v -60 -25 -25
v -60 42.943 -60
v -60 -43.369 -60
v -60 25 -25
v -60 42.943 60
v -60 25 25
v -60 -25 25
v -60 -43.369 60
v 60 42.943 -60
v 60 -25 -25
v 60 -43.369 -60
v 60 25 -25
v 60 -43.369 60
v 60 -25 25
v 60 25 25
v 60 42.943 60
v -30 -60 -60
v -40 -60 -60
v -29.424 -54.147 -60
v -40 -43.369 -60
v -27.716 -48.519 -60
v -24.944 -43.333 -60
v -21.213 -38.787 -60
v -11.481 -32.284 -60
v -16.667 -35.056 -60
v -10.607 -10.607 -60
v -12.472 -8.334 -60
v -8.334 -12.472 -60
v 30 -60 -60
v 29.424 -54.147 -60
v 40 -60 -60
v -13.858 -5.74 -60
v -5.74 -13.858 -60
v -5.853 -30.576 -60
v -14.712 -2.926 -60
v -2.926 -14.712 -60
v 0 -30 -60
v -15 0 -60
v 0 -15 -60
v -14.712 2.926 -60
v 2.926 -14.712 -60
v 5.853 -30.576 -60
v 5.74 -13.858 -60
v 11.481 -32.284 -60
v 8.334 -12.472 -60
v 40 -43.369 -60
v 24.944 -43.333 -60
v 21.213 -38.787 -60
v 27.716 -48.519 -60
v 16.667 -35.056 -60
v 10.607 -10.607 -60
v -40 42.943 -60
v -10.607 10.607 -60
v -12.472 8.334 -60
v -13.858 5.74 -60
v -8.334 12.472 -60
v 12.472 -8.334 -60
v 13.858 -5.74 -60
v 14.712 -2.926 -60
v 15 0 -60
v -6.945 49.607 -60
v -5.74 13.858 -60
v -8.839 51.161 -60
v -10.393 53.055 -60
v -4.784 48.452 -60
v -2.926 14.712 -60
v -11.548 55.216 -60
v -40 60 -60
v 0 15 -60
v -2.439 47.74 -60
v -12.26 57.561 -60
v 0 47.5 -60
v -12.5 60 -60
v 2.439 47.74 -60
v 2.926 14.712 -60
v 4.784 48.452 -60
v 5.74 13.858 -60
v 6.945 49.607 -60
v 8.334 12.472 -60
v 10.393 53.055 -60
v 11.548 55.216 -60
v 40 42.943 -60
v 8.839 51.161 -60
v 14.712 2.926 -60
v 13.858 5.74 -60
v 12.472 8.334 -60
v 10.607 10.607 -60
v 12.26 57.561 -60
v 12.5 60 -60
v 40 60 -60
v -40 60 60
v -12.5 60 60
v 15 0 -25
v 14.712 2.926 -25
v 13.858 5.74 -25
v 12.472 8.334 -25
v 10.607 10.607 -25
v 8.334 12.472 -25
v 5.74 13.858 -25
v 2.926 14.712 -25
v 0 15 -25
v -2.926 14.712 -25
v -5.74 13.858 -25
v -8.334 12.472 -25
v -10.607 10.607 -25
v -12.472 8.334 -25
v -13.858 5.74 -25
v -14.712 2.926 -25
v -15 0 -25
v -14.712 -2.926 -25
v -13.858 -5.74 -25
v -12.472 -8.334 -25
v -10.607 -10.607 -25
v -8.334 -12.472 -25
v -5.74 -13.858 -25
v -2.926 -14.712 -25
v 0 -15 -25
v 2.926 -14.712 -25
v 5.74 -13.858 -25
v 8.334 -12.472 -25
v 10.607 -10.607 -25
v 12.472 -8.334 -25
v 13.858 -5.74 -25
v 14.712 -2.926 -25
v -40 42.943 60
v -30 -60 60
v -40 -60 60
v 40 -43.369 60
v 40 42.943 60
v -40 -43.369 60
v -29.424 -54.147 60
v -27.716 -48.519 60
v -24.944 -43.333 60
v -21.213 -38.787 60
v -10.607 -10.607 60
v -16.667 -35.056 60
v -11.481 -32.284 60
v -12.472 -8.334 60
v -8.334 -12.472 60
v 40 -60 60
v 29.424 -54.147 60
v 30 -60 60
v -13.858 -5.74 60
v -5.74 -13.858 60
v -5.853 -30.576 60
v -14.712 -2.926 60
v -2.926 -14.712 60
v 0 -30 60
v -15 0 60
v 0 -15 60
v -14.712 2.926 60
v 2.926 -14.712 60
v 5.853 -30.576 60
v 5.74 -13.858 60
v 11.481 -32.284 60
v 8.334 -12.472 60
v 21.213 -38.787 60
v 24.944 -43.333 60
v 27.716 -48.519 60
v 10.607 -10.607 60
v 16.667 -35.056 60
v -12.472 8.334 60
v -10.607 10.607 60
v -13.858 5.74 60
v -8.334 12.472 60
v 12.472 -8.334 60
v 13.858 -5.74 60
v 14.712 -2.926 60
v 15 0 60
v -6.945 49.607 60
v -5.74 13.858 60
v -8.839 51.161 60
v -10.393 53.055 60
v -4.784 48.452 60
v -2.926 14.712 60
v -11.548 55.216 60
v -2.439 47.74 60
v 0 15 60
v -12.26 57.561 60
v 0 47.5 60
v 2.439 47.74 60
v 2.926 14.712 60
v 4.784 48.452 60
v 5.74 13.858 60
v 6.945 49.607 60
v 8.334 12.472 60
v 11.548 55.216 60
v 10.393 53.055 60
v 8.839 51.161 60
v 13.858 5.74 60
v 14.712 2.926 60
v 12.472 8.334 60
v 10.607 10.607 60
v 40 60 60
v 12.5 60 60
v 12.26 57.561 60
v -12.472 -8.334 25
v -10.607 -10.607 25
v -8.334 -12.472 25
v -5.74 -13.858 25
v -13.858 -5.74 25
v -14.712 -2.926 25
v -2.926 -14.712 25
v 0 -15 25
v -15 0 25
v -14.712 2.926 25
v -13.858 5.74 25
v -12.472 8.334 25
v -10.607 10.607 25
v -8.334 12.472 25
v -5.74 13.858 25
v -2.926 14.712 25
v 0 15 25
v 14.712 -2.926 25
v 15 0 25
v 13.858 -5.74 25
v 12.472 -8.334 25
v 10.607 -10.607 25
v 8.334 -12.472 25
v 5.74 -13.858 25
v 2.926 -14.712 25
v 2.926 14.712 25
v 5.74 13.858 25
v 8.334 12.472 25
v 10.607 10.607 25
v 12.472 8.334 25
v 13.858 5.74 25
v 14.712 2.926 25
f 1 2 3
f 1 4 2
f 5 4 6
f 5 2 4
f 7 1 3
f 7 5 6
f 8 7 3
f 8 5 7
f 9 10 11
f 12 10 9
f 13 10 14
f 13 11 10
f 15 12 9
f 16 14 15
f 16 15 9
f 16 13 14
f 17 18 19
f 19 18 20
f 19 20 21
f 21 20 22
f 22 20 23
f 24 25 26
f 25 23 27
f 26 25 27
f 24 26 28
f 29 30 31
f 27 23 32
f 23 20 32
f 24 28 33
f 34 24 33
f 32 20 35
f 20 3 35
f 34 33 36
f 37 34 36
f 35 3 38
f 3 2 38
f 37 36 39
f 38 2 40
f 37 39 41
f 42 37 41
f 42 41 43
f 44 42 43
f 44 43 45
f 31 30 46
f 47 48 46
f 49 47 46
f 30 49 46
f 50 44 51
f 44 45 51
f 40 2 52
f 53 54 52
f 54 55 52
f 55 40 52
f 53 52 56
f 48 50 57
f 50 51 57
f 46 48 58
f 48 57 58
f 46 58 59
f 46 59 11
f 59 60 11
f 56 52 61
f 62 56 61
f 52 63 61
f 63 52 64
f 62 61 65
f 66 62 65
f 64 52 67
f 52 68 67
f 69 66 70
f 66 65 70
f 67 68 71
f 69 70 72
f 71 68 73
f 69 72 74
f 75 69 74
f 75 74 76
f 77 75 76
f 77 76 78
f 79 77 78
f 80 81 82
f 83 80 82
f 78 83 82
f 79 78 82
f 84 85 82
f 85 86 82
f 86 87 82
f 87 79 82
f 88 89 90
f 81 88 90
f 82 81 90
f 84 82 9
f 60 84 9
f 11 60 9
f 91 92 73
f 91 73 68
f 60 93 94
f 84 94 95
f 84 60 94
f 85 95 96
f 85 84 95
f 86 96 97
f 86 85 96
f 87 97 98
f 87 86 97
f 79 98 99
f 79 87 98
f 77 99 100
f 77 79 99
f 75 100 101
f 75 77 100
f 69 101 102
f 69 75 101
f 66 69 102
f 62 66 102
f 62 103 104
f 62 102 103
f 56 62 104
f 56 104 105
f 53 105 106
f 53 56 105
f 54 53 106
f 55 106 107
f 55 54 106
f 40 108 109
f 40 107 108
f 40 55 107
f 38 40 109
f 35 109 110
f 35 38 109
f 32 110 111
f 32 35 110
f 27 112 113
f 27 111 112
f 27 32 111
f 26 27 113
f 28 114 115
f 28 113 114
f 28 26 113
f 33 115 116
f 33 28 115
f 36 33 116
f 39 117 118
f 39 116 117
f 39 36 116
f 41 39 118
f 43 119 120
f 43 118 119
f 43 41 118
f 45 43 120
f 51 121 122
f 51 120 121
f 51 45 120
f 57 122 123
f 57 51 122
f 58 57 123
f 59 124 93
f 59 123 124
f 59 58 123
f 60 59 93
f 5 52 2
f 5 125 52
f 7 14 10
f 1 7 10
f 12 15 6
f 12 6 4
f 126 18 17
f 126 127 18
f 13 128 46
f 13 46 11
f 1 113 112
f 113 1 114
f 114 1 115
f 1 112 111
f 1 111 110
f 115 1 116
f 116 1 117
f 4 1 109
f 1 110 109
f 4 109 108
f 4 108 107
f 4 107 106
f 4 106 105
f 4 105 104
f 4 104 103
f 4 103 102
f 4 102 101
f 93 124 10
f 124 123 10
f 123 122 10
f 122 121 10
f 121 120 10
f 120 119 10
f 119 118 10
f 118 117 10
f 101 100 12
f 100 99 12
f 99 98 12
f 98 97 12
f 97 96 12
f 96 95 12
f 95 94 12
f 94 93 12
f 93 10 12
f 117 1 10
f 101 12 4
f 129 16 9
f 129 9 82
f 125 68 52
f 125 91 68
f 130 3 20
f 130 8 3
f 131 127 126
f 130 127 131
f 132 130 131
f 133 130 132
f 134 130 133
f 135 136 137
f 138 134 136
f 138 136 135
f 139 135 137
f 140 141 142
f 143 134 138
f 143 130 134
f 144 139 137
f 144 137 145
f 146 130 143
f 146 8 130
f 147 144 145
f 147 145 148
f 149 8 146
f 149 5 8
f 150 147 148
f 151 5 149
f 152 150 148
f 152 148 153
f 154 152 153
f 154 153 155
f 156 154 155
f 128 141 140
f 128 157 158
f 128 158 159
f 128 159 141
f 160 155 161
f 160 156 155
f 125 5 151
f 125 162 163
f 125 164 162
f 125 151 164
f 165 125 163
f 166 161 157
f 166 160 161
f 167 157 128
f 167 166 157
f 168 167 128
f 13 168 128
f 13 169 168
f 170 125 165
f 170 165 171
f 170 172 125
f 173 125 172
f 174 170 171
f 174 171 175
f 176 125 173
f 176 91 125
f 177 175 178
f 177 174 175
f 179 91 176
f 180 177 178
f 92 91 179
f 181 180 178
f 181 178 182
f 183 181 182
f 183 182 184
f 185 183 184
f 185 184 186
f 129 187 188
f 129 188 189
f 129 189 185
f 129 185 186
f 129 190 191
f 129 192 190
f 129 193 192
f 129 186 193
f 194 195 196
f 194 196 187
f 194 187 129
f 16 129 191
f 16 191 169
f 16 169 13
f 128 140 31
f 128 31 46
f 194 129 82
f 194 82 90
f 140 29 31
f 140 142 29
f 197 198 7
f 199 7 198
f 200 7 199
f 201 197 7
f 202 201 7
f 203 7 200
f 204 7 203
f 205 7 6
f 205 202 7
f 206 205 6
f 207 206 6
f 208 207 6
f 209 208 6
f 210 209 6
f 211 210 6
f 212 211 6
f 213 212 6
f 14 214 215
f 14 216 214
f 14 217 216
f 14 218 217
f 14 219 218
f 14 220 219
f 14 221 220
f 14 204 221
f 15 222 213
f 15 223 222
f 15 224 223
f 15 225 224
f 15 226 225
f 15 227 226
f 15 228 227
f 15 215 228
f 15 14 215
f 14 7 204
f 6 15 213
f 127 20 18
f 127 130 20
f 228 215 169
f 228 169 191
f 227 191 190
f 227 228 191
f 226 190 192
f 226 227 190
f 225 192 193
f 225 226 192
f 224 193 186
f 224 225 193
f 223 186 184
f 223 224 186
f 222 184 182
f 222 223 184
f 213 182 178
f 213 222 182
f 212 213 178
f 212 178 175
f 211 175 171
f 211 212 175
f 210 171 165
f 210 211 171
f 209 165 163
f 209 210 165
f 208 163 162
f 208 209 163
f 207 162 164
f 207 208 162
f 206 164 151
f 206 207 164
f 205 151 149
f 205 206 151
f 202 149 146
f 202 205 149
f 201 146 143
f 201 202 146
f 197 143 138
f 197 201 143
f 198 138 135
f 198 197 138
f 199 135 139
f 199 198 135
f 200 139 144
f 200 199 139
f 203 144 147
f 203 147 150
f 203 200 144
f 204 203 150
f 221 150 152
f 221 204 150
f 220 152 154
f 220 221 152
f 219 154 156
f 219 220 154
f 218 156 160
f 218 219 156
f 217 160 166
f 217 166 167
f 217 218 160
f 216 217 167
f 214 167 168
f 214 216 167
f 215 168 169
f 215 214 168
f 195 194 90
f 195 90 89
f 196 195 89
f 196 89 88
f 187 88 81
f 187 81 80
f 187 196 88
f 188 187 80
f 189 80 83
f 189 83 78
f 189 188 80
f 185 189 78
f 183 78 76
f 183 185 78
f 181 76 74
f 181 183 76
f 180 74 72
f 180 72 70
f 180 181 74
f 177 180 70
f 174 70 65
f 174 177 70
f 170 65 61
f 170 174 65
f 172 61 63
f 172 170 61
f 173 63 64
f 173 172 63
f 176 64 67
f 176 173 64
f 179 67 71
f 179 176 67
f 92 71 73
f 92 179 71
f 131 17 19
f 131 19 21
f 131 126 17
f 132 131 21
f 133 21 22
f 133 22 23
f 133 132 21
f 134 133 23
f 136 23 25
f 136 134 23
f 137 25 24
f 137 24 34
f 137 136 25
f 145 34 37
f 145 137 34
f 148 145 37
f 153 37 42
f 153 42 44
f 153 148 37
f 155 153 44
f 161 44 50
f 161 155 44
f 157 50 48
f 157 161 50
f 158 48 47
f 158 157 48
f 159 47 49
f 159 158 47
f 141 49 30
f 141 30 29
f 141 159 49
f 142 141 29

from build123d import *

# Parameters (mm, degrees)
SKETCH1_R           = 15
BOSS_EXTRUDE1_DEPTH = 60
SKETCH2_W           = 50
SKETCH2_H           = 50
CUT_EXTRUDE1_DEPTH  = 120


with BuildPart() as part:
    # Sketch1 → Boss-Extrude1 (new body, symmetric)
    with BuildSketch(Plane.XY):
        with BuildLine():
            Line((30, -60), (40, -60))
            Line((40, -60), (40, -43.369403571))
            Line((40, -43.369403571), (60, -43.369403571))
            Line((60, -43.369403571), (60, 42.942577675))
            Line((60, 42.942577675), (40, 42.942577675))
            Line((40, 42.942577675), (40, 60))
            Line((40, 60), (12.5, 60))
            ThreePointArc((12.5, 60), (0, 47.5), (-12.5, 60))
            Line((-12.5, 60), (-40, 60))
            Line((-40, 60), (-40, 42.942577675))
            Line((-40, 42.942577675), (-60, 42.942577675))
            Line((-60, 42.942577675), (-60, 0))
            Line((-60, 0), (-60, -43.369403571))
            Line((-60, -43.369403571), (-40, -43.369403571))
            Line((-40, -43.369403571), (-40, -60))
            Line((-40, -60), (-30, -60))
            ThreePointArc((-30, -60), (0, -30), (30, -60))
        make_face()
        Circle(SKETCH1_R, mode=Mode.SUBTRACT)
    extrude(amount=BOSS_EXTRUDE1_DEPTH, both=True)

    # Sketch2 → Cut-Extrude1 (cut)
    with BuildSketch(Plane(origin=(60, 0, 0), x_dir=(0, 0, -1), z_dir=(1, 0, 0))):
        Rectangle(SKETCH2_W, SKETCH2_H)
    extrude(amount=-CUT_EXTRUDE1_DEPTH, mode=Mode.SUBTRACT)


solid = part.part
